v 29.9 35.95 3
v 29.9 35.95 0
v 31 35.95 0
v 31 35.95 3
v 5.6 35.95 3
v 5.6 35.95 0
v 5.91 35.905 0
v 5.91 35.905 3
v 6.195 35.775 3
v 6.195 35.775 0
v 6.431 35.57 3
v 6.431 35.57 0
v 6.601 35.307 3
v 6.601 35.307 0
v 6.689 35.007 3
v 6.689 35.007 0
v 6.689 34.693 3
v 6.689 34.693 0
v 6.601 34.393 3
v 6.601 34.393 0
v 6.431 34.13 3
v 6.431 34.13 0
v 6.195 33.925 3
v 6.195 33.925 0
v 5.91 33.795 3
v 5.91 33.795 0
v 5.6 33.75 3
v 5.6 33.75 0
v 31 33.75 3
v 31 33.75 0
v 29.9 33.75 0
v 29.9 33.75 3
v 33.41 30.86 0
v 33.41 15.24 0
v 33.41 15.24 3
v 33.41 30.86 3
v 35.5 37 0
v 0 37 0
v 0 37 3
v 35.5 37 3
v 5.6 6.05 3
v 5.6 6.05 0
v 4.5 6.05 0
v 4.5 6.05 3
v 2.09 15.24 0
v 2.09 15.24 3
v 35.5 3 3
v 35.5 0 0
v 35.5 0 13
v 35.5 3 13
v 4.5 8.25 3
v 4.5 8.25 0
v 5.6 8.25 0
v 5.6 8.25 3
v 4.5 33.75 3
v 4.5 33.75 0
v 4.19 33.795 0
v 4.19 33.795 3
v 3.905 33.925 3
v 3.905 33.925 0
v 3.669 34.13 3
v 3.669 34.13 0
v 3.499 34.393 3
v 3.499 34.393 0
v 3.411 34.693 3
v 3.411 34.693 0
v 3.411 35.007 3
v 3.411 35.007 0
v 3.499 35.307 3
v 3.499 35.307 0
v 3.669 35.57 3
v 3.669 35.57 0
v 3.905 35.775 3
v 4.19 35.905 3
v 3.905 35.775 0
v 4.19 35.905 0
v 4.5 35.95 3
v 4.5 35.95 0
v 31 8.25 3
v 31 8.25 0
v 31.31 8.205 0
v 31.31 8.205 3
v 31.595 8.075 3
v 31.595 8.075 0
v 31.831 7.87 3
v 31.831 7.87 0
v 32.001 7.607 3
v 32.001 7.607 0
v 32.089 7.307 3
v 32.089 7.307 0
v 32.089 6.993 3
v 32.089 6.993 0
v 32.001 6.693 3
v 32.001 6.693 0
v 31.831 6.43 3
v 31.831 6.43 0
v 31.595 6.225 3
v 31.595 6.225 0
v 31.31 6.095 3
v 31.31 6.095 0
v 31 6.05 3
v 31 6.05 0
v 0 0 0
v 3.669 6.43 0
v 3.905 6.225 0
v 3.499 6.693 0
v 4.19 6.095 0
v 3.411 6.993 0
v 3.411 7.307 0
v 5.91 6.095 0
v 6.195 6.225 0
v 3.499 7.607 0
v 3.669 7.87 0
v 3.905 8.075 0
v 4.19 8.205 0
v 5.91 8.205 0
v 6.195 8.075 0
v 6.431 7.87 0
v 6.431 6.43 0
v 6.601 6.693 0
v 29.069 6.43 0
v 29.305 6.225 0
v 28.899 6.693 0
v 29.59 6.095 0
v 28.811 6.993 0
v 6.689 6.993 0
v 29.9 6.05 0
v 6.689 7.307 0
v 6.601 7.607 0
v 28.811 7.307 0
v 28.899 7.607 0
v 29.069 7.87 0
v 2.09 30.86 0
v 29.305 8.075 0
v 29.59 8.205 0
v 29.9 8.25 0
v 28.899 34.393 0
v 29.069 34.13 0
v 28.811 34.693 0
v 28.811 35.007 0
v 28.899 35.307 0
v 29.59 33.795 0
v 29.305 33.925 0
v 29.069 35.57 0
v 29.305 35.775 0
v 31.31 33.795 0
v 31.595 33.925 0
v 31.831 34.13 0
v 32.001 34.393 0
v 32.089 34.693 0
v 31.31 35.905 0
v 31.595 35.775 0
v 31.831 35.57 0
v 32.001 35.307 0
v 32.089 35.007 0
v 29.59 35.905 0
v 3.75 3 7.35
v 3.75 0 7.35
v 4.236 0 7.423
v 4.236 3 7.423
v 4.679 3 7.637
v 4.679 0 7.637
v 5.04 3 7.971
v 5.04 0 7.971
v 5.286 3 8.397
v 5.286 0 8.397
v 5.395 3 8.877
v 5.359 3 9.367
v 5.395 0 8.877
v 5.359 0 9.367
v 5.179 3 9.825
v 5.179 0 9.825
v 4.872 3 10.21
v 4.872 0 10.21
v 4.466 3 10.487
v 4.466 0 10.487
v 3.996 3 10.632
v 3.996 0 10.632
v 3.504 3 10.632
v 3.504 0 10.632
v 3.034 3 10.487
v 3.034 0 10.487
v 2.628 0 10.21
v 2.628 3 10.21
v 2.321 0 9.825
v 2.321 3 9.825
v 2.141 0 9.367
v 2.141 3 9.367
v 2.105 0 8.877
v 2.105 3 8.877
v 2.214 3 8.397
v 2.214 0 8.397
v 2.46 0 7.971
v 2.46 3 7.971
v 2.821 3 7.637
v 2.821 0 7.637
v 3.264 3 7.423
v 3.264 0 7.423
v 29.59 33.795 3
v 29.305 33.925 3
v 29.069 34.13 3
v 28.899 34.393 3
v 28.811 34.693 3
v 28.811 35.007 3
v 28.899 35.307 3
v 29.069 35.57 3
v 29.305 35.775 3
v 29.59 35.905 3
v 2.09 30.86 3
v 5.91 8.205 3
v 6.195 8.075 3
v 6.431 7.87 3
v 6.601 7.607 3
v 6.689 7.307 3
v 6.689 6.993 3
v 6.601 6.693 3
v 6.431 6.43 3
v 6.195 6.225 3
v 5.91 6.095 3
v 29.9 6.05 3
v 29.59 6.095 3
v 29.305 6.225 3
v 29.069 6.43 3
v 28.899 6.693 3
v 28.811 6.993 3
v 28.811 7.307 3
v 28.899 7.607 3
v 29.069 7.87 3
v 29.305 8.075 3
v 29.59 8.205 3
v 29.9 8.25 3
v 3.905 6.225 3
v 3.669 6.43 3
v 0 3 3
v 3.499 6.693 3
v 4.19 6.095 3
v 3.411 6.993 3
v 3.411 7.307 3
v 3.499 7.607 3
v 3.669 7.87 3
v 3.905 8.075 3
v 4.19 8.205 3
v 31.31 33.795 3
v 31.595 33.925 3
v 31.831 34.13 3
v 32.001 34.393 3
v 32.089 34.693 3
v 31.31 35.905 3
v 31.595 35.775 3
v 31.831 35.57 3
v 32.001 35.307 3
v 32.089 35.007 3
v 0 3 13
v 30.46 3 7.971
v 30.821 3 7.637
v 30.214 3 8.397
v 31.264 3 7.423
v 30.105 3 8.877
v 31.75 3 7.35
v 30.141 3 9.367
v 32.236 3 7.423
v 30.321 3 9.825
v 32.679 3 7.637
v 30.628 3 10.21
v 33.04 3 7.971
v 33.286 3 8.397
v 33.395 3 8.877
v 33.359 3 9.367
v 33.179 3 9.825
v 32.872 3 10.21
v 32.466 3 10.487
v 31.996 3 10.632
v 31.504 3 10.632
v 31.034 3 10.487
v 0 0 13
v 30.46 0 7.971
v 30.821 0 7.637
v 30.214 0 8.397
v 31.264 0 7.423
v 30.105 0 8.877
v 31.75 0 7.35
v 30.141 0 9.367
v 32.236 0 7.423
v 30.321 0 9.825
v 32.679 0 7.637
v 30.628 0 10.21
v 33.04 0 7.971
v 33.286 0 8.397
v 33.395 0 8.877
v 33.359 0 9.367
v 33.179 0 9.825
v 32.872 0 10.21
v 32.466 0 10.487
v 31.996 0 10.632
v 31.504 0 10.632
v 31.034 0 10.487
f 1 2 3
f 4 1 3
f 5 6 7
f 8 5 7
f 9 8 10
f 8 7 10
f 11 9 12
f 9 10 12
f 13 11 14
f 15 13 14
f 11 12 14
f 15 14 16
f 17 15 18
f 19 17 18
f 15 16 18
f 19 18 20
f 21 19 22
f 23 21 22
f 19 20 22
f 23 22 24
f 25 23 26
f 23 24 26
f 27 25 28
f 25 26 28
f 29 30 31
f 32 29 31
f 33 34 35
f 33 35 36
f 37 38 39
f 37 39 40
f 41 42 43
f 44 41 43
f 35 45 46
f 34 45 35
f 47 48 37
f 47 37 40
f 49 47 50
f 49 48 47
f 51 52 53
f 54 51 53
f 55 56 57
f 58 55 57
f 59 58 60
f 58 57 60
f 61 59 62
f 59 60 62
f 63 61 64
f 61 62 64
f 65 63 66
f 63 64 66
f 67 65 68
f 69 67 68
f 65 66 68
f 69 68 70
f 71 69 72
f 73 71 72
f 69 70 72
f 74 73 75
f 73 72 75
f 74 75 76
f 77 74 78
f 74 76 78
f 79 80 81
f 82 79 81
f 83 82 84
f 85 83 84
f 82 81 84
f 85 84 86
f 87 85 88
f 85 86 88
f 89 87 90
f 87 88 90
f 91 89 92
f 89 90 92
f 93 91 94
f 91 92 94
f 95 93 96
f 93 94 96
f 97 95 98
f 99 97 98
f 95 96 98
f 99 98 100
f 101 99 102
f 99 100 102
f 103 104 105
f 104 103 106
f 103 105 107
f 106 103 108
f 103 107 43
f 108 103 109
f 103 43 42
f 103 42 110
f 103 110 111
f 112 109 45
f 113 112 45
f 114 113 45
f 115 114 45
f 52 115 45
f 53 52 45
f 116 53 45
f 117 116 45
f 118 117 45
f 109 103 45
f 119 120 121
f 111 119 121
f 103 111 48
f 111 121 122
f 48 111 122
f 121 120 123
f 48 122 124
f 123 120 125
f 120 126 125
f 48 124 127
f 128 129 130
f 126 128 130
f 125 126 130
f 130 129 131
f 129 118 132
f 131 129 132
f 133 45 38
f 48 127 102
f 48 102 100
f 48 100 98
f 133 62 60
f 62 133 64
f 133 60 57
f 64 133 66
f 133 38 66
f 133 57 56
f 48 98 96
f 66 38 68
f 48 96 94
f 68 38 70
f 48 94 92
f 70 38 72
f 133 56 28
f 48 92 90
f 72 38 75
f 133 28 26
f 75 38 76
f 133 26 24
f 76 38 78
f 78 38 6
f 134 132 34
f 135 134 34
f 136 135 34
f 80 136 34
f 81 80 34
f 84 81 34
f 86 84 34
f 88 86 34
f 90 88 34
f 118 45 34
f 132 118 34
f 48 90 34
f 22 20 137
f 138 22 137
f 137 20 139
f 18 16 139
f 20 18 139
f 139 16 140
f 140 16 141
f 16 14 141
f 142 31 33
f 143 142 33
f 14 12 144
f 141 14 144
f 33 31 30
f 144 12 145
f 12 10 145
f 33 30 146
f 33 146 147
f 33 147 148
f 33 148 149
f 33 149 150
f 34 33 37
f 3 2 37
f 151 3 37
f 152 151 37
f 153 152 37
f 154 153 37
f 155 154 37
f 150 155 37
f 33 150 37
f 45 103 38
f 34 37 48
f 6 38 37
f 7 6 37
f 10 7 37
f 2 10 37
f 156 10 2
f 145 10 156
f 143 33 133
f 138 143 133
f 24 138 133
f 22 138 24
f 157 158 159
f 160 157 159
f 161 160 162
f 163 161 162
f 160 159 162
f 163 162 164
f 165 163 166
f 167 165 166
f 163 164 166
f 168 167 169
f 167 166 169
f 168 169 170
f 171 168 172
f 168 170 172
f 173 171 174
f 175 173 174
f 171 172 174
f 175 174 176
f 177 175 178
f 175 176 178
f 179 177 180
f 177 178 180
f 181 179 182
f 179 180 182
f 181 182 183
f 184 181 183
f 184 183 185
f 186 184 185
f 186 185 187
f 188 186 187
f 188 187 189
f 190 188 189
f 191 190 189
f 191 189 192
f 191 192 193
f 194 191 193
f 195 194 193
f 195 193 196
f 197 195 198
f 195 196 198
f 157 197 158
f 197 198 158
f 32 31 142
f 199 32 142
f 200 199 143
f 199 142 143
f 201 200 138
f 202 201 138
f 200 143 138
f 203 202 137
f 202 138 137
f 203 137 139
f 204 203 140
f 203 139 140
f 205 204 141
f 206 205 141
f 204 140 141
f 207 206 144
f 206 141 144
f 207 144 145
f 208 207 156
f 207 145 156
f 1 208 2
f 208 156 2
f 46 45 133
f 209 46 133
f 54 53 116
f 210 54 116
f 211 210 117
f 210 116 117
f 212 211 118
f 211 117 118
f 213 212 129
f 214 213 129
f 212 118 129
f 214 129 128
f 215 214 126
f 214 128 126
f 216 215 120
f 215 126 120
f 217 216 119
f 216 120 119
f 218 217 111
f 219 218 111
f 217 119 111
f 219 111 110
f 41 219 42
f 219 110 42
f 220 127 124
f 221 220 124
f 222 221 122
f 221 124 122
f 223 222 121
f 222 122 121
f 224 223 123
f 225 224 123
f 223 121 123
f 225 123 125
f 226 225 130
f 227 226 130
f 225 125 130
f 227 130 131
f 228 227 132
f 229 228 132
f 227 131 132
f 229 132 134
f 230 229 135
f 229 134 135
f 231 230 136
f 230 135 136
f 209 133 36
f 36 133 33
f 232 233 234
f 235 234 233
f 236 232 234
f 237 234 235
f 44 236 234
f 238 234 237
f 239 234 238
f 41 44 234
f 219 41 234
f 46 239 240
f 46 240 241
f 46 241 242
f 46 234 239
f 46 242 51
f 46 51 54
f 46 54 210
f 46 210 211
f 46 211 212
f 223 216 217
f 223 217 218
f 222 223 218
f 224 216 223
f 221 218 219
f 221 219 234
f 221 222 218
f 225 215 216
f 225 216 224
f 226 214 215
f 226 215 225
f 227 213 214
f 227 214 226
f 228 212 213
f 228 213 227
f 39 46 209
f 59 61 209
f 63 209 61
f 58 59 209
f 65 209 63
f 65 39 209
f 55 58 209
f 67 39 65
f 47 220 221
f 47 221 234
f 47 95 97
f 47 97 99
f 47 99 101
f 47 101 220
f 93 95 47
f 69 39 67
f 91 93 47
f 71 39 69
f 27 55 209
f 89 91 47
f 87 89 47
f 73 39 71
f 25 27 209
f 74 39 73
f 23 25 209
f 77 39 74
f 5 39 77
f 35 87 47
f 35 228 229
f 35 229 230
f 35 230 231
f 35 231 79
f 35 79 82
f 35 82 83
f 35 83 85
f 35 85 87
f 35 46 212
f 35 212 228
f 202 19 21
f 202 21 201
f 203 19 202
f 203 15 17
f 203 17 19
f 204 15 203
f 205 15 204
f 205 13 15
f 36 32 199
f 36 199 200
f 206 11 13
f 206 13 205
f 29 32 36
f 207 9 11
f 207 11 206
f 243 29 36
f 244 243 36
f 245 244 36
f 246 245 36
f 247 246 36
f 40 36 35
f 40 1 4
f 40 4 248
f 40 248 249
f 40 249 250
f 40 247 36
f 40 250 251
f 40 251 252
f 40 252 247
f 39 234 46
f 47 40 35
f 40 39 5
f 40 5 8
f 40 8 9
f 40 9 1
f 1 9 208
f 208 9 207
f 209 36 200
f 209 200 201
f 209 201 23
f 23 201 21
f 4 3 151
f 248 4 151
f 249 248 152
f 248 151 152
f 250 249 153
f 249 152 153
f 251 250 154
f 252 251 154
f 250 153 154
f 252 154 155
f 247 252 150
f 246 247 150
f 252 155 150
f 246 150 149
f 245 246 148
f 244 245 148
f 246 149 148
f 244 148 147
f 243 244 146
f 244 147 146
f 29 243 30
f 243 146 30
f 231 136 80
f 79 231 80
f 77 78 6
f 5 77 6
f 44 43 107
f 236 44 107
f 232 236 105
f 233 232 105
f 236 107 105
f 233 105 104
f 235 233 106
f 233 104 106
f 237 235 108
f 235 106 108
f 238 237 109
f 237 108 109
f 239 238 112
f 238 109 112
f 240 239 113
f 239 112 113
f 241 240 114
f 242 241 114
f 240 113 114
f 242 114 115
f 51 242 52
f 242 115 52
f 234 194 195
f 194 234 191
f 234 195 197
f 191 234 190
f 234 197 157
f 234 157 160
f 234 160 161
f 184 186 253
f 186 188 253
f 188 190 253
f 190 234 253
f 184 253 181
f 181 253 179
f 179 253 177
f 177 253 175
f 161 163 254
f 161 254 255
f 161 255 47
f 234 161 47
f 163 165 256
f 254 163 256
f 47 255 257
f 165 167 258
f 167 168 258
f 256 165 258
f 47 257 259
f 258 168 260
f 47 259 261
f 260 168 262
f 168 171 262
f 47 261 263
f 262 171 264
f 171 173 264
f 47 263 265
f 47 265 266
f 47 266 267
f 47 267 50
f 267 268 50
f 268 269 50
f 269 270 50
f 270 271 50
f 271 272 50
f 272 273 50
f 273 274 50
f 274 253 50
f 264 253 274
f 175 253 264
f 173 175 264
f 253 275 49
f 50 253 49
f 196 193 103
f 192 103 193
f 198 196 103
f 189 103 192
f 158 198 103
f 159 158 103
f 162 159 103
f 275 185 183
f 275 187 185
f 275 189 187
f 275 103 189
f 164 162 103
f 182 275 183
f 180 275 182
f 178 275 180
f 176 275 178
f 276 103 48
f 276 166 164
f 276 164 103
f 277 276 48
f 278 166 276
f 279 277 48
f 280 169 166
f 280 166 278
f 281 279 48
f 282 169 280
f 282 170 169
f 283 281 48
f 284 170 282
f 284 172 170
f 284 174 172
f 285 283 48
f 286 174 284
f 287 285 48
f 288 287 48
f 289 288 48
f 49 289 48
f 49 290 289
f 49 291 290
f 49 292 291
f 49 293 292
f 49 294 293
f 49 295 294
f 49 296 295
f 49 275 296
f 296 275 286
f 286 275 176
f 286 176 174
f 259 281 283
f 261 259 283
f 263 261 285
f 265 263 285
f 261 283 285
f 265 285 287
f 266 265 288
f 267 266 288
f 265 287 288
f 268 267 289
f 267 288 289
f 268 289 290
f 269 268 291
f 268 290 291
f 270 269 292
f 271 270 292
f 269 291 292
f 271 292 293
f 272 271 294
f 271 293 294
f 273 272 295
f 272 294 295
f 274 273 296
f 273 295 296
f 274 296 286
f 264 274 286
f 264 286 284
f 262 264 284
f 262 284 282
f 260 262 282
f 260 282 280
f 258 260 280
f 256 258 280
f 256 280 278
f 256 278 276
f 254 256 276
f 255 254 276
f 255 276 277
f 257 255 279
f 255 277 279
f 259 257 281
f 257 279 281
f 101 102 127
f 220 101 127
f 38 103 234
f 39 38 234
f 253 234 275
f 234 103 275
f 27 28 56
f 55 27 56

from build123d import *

# Parameters (mm, degrees)
SKETCH1_W           = 35.5
SKETCH1_H           = 37
SKETCH1_W_2         = 31.32
SKETCH1_H_2         = 15.62
BOSS_EXTRUDE1_DEPTH = 3
SKETCH2_W           = 35.5
SKETCH2_H           = 10
SKETCH2_R           = 1.65
BOSS_EXTRUDE2_DEPTH = 3


with BuildPart() as part:
    # Sketch1 → Boss-Extrude1 (new body)
    with BuildSketch(Plane.XY):
        with Locations((17.75, 18.5)):
            Rectangle(SKETCH1_W, SKETCH1_H)
        with BuildLine():
            Line((4.5, 35.95), (5.6, 35.95))
            ThreePointArc((5.6, 35.95), (6.7, 34.85), (5.6, 33.75))
            Line((5.6, 33.75), (4.5, 33.75))
            ThreePointArc((4.5, 33.75), (3.4, 34.85), (4.5, 35.95))
        make_face(mode=Mode.SUBTRACT)
        with BuildLine():
            Line((29.9, 35.95), (31, 35.95))
            ThreePointArc((31, 35.95), (32.1, 34.85), (31, 33.75))
            Line((31, 33.75), (29.9, 33.75))
            ThreePointArc((29.9, 33.75), (28.8, 34.85), (29.9, 35.95))
        make_face(mode=Mode.SUBTRACT)
        with BuildLine():
            Line((29.9, 8.25), (31, 8.25))
            ThreePointArc((31, 8.25), (32.1, 7.15), (31, 6.05))
            Line((31, 6.05), (29.9, 6.05))
            ThreePointArc((29.9, 6.05), (28.8, 7.15), (29.9, 8.25))
        make_face(mode=Mode.SUBTRACT)
        with BuildLine():
            Line((4.5, 8.25), (5.6, 8.25))
            ThreePointArc((5.6, 8.25), (6.7, 7.15), (5.6, 6.05))
            Line((5.6, 6.05), (4.5, 6.05))
            ThreePointArc((4.5, 6.05), (3.4, 7.15), (4.5, 8.25))
        make_face(mode=Mode.SUBTRACT)
        with Locations((17.75, 23.05)):
            Rectangle(SKETCH1_W_2, SKETCH1_H_2, mode=Mode.SUBTRACT)
    extrude(amount=BOSS_EXTRUDE1_DEPTH)

    # Sketch2 → Boss-Extrude2 (add)
    with BuildSketch(Plane.XZ):
        with Locations((17.75, 8)):
            Rectangle(SKETCH2_W, SKETCH2_H)
        with Locations(Location((3.75, 9, 0), (0, 0, 270))):
            Circle(SKETCH2_R, mode=Mode.SUBTRACT)
        with Locations(Location((31.75, 9, 0), (0, 0, 270))):
            Circle(SKETCH2_R, mode=Mode.SUBTRACT)
    extrude(amount=-BOSS_EXTRUDE2_DEPTH)


solid = part.part
